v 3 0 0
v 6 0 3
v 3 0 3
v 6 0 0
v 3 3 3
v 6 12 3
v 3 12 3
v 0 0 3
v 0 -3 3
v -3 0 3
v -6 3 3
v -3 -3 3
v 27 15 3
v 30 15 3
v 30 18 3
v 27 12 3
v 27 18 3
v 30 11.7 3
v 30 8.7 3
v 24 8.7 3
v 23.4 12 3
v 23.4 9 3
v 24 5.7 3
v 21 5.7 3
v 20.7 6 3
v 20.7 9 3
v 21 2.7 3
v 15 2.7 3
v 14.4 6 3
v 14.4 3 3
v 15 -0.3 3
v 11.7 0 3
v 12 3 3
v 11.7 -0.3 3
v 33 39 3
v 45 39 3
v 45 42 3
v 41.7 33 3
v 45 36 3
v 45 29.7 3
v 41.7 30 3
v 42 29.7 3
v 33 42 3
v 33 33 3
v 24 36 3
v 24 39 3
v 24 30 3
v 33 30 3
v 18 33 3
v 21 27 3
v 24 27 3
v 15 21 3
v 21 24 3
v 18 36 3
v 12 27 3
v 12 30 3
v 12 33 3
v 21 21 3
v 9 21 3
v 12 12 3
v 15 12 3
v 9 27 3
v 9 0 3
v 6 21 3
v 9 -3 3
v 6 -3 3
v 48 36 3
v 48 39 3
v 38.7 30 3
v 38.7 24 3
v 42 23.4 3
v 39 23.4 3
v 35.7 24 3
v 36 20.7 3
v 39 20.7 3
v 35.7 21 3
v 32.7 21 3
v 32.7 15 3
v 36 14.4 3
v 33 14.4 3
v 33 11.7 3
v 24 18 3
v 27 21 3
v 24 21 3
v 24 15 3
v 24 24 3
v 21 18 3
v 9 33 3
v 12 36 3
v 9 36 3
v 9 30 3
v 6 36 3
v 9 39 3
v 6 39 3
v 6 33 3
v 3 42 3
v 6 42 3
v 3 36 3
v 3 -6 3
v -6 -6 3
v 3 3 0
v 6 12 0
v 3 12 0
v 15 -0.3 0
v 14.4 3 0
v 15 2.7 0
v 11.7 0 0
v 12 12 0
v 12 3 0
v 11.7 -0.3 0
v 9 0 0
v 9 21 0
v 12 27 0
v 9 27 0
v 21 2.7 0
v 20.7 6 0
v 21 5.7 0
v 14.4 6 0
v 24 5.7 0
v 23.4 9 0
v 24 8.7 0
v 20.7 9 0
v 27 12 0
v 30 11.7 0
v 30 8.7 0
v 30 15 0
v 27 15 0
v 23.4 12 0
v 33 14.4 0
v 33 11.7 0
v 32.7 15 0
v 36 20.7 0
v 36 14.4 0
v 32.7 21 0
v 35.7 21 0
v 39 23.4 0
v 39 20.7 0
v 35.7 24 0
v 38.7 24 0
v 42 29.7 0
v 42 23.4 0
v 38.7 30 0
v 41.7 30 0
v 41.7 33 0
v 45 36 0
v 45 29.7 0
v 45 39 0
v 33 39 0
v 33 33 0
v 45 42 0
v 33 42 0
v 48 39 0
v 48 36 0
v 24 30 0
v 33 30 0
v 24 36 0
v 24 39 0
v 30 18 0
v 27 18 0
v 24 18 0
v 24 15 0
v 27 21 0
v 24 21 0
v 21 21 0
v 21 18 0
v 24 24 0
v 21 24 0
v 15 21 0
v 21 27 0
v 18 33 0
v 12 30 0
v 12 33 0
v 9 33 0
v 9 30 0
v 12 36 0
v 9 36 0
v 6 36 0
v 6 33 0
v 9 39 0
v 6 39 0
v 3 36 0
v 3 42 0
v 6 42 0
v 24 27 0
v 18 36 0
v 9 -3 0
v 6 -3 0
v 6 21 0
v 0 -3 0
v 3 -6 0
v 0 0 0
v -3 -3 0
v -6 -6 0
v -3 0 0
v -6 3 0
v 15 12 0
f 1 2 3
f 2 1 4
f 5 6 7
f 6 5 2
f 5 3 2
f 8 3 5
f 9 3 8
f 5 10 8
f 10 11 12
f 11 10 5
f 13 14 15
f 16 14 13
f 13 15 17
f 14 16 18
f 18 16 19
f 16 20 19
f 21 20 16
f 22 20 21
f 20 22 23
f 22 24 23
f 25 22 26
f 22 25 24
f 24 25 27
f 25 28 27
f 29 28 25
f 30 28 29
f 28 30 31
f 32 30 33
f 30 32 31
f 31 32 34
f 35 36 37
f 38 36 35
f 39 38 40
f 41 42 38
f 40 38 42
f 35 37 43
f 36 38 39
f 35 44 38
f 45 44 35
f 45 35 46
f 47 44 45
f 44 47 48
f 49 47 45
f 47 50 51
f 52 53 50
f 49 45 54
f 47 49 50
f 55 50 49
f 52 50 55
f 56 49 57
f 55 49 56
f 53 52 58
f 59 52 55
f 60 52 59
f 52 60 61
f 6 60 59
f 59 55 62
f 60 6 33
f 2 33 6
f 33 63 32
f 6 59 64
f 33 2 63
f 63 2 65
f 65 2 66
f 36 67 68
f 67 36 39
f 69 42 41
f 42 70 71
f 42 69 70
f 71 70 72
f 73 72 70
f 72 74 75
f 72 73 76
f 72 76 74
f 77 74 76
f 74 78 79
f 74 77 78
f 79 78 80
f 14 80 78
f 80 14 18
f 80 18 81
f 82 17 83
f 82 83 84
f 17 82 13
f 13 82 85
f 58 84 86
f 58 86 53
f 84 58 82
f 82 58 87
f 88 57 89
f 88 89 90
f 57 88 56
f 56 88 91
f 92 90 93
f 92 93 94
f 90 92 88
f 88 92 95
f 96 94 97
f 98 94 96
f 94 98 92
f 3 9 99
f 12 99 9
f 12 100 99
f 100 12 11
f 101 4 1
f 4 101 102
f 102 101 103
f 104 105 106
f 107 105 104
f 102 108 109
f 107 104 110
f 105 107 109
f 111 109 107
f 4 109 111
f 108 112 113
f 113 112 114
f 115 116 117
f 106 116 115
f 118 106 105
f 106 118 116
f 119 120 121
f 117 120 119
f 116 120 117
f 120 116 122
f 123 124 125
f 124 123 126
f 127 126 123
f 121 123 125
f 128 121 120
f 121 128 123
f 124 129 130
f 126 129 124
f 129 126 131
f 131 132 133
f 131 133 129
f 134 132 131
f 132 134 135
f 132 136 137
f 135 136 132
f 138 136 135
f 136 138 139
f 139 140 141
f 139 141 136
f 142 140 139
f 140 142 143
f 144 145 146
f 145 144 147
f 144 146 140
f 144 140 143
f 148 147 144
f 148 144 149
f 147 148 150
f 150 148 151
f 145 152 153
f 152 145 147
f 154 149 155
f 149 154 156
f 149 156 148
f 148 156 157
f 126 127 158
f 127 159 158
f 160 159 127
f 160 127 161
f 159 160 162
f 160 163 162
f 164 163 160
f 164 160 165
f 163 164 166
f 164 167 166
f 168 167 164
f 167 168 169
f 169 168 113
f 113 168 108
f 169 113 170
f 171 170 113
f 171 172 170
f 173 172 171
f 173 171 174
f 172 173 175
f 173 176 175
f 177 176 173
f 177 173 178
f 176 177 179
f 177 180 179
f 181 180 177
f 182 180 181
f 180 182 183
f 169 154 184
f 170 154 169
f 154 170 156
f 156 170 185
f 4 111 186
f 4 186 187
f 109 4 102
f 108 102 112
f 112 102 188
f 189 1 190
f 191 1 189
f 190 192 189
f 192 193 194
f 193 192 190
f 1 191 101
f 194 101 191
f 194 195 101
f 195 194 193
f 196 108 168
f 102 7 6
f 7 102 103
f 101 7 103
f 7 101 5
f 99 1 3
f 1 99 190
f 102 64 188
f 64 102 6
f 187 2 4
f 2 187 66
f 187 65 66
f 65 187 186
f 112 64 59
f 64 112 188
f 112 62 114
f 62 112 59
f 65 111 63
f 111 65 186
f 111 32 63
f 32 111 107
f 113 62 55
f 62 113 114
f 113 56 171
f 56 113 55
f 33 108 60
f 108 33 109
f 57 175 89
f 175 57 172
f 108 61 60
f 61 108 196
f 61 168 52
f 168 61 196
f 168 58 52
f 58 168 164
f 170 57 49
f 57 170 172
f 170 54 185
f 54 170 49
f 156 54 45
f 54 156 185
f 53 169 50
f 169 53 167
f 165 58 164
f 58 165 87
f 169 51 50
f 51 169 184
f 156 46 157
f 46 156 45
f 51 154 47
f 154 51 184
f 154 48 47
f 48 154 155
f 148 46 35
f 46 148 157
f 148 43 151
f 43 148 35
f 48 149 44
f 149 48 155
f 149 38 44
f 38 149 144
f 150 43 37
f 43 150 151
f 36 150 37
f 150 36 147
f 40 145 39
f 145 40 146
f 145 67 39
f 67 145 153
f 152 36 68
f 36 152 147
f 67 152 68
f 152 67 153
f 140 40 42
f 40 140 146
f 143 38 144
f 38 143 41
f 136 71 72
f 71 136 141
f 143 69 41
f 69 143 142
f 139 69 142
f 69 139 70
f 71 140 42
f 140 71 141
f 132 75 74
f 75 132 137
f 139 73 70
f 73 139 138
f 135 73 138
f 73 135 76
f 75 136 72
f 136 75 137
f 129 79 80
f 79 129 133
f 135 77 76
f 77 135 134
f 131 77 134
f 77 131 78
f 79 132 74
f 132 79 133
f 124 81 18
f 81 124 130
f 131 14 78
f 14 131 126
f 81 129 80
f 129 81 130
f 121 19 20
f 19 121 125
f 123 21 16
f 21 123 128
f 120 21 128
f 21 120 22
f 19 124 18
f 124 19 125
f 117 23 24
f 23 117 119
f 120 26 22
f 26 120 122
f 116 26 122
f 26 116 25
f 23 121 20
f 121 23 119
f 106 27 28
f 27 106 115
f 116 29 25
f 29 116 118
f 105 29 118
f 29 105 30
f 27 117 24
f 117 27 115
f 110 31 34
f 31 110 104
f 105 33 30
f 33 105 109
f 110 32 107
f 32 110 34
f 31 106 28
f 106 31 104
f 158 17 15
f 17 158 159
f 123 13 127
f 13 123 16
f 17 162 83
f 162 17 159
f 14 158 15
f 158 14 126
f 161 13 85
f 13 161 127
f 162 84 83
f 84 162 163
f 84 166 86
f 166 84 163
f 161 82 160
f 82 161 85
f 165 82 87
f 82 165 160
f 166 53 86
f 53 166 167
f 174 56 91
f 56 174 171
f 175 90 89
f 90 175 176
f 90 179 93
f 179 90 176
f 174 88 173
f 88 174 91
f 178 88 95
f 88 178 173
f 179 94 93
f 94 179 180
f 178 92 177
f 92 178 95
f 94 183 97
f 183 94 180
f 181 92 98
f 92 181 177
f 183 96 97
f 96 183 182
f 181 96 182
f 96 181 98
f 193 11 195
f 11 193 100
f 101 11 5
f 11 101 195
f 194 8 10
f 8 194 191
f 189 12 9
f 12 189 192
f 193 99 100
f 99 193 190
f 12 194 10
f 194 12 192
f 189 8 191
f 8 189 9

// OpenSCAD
//Minecraft Tools
//Developed by Rich Pereira
//rich@pereira.com
//--------------------------
//More to come!
//--------------------------


//CUSTOMIZER VARIABLES

//	Select tool
tool = 8;	//	[1:Spade, 2:Pickaxe, 3:Axe, 4:Hoe, 5:Sword, 6:Egg, 7:Bow, 8: BowAndArrow]

//	Scale (tenths of mm per cube)
cube_size = 30;	//	[1:50]

//  Whether to add a hanger hole ath -1, -1
hanghole = 1;  // [0:No, 1: Yes]

//CUSTOMIZER VARIABLES END

scale([cube_size/10,cube_size/10,cube_size/10]) {
    if (tool==1) spade();
    if (tool==2) pick();
    if (tool==3) axe();
    if (tool==4) hoe();
    if (tool==5) sword();
    if (tool==6) egg();
    if (tool==7) bow();
    if (tool==8) bow_and_arrow();
        
    if (hanghole == 1) {
        translate([-2,0,0]) cube([3,1,1]);
        translate([-2,-2,0]) cube([3,1,1]);
        translate([-2,-1,0]) cube([1,1,1]);
        translate([0,-1,0]) cube([1,1,1]);
    }
}



module bow_and_arrow() {
    // move the model so the hanger hole is in a good place
    translate([16,14,0]) mirror([1,1,0]) {
    // body
    translate([10,14,0]) cube([4,1,1]);
    translate([7,13,0]) cube([8,1,1]);
    translate([5,12,0]) cube([9,1,1]);
    translate([4,11,0]) cube([6,1,1]);
    translate([3,10,0]) cube([4,1,1]);
    translate([2,9,0]) cube([3,1,1]);
    translate([2,8,0]) cube([3,1,1]);
    translate([1,7,0]) cube([3,1,1]);
    translate([1,6,0]) cube([3,1,1]);
    translate([1,5,0]) cube([3,1,1]);
    translate([0,4,0]) cube([3,1,1]);
    translate([0,3,0]) cube([3,1,1]);
    translate([0,2,0]) cube([3,1,1]);
    translate([0,1,0]) cube([3,1,1]);
    translate([1,0,0]) cube([1,1,1]);
    // string
    stringcube=1.1;
    translate([3,1,0]) cube([stringcube,stringcube,1]);
    translate([4,2,0]) cube([2*stringcube,stringcube,1]);
    translate([6,3,0]) cube([stringcube,stringcube,1]);
    translate([7,4,0]) cube([2*stringcube,stringcube,1]);
    translate([9,5,0]) cube([stringcube,stringcube,1]);
    translate([10,6,0]) cube([stringcube,2*stringcube,1]);
    translate([11,8,0]) cube([stringcube,stringcube,1]);
    translate([12,9,0]) cube([stringcube,2*stringcube,1]);
    translate([13,11,0]) cube([stringcube,stringcube,1]);
    
    // arrow
    translate([8,6,0]) cube([2,1,1]);
    translate([7,7,0]) cube([2,1,1]);
    translate([6,8,0]) cube([2,1,1]);
    translate([5,9,0]) cube([2,1,1]);
    translate([4,10,0]) cube([2,1,1]);
    translate([3,11,0]) cube([2,1,1]);
    translate([2,12,0]) cube([2,1,1]);
    translate([1,13,0]) cube([2,1,1]);
    translate([0,14,0]) cube([2,1,1]);
}
};

module bow() {
    // body
    translate([10,14,0]) cube([4,1,1]);
    translate([7,13,0]) cube([8,1,1]);
    translate([5,12,0]) cube([9,1,1]);
    translate([4,11,0]) cube([6,1,1]);
    translate([3,10,0]) cube([4,1,1]);
    translate([2,9,0]) cube([3,1,1]);
    translate([2,8,0]) cube([3,1,1]);
    translate([1,7,0]) cube([3,1,1]);
    translate([1,6,0]) cube([3,1,1]);
    translate([1,5,0]) cube([3,1,1]);
    translate([0,4,0]) cube([3,1,1]);
    translate([0,3,0]) cube([3,1,1]);
    translate([0,2,0]) cube([3,1,1]);
    translate([0,1,0]) cube([3,1,1]);
    translate([1,0,0]) cube([1,1,1]);
    // string
    stringcube=1.05;
    translate([3,2,0]) cube([stringcube,stringcube,1]);
    translate([4,3,0]) cube([stringcube,stringcube,1]);
    translate([5,4,0]) cube([stringcube,stringcube,1]);
    translate([6,5,0]) cube([stringcube,stringcube,1]);
    translate([7,6,0]) cube([stringcube,stringcube,1]);
    translate([8,7,0]) cube([stringcube,stringcube,1]);
    translate([9,8,0]) cube([stringcube,stringcube,1]);
    translate([10,9,0]) cube([stringcube,stringcube,1]);
    translate([11,10,0]) cube([stringcube,stringcube,1]);
    translate([12,11,0]) cube([stringcube,stringcube,1]);
};

module spade() {
    translate([9,12,0]) cube([3,1,1]);
    translate([8,11,0]) cube([5,1,1]);
    translate([7,10,0]) cube([6,1,1]);
    translate([6,9,0]) cube([7,1,1]);
    translate([7,8,0]) cube([5,1,1]);
    translate([6,7,0]) cube([5,1,1]);
    translate([5,6,0]) cube([3,1,1]);
    translate([4,5,0]) cube([3,1,1]);
    translate([3,4,0]) cube([3,1,1]);
    translate([2,3,0]) cube([3,1,1]);
    translate([0,2,0]) cube([4,1,1]);
    translate([0,1,0]) cube([3,1,1]);
    translate([1,0,0]) cube([2,1,1]);
    translate([9,6,0]) cube([1,1,1]);
};

module pick() {
    translate([4,12,0]) cube([5,1,1]);
    translate([3,11,0]) cube([9,1,1]);
    translate([4,10,0]) cube([8,1,1]);
    translate([8,9,0]) cube([4,1,1]);
    translate([7,8,0]) cube([6,1,1]);
    translate([6,7,0]) cube([3,1,1]);
    translate([5,6,0]) cube([3,1,1]);
    translate([4,5,0]) cube([3,1,1]);
    translate([3,4,0]) cube([3,1,1]);
    translate([2,3,0]) cube([3,1,1]);
    translate([1,2,0]) cube([3,1,1]);
    translate([0,1,0]) cube([3,1,1]);
    translate([0,0,0]) cube([2,1,1]);
    translate([10,7,0]) cube([3,1,1]);
    translate([10,6,0]) cube([3,1,1]);
    translate([10,5,0]) cube([3,1,1]);
    translate([10,4,0]) cube([3,1,1]);
    translate([11,3,0]) cube([1,1,1]);
};

module axe() {
    translate([8,14,0]) cube([2,1,1]);
    translate([7,13,0]) cube([4,1,1]);
    translate([6,12,0]) cube([5,1,1]);
    translate([5,11,0]) cube([7,1,1]);
    translate([5,10,0]) cube([7,1,1]);
    translate([6,9,0]) cube([7,1,1]);
    translate([7,8,0]) cube([6,1,1]);
    translate([6,7,0]) cube([3,1,1]);
    translate([5,6,0]) cube([3,1,1]);
    translate([4,5,0]) cube([3,1,1]);
    translate([3,4,0]) cube([3,1,1]);
    translate([2,3,0]) cube([3,1,1]);
    translate([1,2,0]) cube([3,1,1]);
    translate([0,1,0]) cube([3,1,1]);
    translate([0,0,0]) cube([2,1,1]);
    translate([10,7,0]) cube([2,1,1]);
};

module hoe() {
    translate([5,13,0]) cube([3,1,1]);
    translate([4,12,0]) cube([5,1,1]);
    translate([5,11,0]) cube([7,1,1]);
    translate([7,10,0]) cube([5,1,1]);
    translate([8,9,0]) cube([4,1,1]);
    translate([7,8,0]) cube([4,1,1]);
    translate([6,7,0]) cube([3,1,1]);
    translate([5,6,0]) cube([3,1,1]);
    translate([4,5,0]) cube([3,1,1]);
    translate([3,4,0]) cube([3,1,1]);
    translate([2,3,0]) cube([3,1,1]);
    translate([1,2,0]) cube([3,1,1]);
    translate([0,1,0]) cube([3,1,1]);
    translate([0,0,0]) cube([2,1,1]);
};

module egg() {
    translate([4,12,0]) cube([4,1,1]);
    translate([3,11,0]) cube([6,1,1]);
    translate([2,10,0]) cube([8,1,1]);
    translate([1,9,0]) cube([9,1,1]);
    translate([1,8,0]) cube([10,1,1]);
    translate([0,7,0]) cube([11,1,1]);
    translate([0,6,0]) cube([12,1,1]);
    translate([0,5,0]) cube([12,1,1]);
    translate([0,4,0]) cube([12,1,1]);
    translate([1,3,0]) cube([10,1,1]);
    translate([1,2,0]) cube([10,1,1]);
    translate([2,1,0]) cube([8,1,1]);
    translate([3,0,0]) cube([6,1,1]);
};

module sword() {
    translate([13,15,0]) cube ([3,1,1]);
    translate([12,14,0]) cube ([4,1,1]);
    translate([11,13,0]) cube ([5,1,1]);
    translate([10,12,0]) cube ([5,1,1]);
    translate([9,11,0]) cube ([5,1,1]);
    translate([8,10,0]) cube ([5,1,1]);
    translate([2,9,0]) cube ([2,1,1]);
    translate([2,8,0]) cube ([3,1,1]);
    translate([3,7,0]) cube ([7,1,1]);
    translate([3,6,0]) cube ([6,1,1]);
    translate([4,5,0]) cube ([4,1,1]);
    translate([3,4,0]) cube ([6,1,1]);
    translate([2,3,0]) cube ([3,1,1]);
    translate([0,2,0]) cube ([4,1,1]);
    translate([0,1,0]) cube ([3,1,1]);
    translate([0,0,0]) cube ([3,1,1]);
    translate([7,9,0]) cube ([5,1,1]);
    translate([6,8,0]) cube ([5,1,1]);
    translate([6,3,0]) cube ([4,1,1]);
    translate([8,2,0]) cube ([2,1,1]);
};
